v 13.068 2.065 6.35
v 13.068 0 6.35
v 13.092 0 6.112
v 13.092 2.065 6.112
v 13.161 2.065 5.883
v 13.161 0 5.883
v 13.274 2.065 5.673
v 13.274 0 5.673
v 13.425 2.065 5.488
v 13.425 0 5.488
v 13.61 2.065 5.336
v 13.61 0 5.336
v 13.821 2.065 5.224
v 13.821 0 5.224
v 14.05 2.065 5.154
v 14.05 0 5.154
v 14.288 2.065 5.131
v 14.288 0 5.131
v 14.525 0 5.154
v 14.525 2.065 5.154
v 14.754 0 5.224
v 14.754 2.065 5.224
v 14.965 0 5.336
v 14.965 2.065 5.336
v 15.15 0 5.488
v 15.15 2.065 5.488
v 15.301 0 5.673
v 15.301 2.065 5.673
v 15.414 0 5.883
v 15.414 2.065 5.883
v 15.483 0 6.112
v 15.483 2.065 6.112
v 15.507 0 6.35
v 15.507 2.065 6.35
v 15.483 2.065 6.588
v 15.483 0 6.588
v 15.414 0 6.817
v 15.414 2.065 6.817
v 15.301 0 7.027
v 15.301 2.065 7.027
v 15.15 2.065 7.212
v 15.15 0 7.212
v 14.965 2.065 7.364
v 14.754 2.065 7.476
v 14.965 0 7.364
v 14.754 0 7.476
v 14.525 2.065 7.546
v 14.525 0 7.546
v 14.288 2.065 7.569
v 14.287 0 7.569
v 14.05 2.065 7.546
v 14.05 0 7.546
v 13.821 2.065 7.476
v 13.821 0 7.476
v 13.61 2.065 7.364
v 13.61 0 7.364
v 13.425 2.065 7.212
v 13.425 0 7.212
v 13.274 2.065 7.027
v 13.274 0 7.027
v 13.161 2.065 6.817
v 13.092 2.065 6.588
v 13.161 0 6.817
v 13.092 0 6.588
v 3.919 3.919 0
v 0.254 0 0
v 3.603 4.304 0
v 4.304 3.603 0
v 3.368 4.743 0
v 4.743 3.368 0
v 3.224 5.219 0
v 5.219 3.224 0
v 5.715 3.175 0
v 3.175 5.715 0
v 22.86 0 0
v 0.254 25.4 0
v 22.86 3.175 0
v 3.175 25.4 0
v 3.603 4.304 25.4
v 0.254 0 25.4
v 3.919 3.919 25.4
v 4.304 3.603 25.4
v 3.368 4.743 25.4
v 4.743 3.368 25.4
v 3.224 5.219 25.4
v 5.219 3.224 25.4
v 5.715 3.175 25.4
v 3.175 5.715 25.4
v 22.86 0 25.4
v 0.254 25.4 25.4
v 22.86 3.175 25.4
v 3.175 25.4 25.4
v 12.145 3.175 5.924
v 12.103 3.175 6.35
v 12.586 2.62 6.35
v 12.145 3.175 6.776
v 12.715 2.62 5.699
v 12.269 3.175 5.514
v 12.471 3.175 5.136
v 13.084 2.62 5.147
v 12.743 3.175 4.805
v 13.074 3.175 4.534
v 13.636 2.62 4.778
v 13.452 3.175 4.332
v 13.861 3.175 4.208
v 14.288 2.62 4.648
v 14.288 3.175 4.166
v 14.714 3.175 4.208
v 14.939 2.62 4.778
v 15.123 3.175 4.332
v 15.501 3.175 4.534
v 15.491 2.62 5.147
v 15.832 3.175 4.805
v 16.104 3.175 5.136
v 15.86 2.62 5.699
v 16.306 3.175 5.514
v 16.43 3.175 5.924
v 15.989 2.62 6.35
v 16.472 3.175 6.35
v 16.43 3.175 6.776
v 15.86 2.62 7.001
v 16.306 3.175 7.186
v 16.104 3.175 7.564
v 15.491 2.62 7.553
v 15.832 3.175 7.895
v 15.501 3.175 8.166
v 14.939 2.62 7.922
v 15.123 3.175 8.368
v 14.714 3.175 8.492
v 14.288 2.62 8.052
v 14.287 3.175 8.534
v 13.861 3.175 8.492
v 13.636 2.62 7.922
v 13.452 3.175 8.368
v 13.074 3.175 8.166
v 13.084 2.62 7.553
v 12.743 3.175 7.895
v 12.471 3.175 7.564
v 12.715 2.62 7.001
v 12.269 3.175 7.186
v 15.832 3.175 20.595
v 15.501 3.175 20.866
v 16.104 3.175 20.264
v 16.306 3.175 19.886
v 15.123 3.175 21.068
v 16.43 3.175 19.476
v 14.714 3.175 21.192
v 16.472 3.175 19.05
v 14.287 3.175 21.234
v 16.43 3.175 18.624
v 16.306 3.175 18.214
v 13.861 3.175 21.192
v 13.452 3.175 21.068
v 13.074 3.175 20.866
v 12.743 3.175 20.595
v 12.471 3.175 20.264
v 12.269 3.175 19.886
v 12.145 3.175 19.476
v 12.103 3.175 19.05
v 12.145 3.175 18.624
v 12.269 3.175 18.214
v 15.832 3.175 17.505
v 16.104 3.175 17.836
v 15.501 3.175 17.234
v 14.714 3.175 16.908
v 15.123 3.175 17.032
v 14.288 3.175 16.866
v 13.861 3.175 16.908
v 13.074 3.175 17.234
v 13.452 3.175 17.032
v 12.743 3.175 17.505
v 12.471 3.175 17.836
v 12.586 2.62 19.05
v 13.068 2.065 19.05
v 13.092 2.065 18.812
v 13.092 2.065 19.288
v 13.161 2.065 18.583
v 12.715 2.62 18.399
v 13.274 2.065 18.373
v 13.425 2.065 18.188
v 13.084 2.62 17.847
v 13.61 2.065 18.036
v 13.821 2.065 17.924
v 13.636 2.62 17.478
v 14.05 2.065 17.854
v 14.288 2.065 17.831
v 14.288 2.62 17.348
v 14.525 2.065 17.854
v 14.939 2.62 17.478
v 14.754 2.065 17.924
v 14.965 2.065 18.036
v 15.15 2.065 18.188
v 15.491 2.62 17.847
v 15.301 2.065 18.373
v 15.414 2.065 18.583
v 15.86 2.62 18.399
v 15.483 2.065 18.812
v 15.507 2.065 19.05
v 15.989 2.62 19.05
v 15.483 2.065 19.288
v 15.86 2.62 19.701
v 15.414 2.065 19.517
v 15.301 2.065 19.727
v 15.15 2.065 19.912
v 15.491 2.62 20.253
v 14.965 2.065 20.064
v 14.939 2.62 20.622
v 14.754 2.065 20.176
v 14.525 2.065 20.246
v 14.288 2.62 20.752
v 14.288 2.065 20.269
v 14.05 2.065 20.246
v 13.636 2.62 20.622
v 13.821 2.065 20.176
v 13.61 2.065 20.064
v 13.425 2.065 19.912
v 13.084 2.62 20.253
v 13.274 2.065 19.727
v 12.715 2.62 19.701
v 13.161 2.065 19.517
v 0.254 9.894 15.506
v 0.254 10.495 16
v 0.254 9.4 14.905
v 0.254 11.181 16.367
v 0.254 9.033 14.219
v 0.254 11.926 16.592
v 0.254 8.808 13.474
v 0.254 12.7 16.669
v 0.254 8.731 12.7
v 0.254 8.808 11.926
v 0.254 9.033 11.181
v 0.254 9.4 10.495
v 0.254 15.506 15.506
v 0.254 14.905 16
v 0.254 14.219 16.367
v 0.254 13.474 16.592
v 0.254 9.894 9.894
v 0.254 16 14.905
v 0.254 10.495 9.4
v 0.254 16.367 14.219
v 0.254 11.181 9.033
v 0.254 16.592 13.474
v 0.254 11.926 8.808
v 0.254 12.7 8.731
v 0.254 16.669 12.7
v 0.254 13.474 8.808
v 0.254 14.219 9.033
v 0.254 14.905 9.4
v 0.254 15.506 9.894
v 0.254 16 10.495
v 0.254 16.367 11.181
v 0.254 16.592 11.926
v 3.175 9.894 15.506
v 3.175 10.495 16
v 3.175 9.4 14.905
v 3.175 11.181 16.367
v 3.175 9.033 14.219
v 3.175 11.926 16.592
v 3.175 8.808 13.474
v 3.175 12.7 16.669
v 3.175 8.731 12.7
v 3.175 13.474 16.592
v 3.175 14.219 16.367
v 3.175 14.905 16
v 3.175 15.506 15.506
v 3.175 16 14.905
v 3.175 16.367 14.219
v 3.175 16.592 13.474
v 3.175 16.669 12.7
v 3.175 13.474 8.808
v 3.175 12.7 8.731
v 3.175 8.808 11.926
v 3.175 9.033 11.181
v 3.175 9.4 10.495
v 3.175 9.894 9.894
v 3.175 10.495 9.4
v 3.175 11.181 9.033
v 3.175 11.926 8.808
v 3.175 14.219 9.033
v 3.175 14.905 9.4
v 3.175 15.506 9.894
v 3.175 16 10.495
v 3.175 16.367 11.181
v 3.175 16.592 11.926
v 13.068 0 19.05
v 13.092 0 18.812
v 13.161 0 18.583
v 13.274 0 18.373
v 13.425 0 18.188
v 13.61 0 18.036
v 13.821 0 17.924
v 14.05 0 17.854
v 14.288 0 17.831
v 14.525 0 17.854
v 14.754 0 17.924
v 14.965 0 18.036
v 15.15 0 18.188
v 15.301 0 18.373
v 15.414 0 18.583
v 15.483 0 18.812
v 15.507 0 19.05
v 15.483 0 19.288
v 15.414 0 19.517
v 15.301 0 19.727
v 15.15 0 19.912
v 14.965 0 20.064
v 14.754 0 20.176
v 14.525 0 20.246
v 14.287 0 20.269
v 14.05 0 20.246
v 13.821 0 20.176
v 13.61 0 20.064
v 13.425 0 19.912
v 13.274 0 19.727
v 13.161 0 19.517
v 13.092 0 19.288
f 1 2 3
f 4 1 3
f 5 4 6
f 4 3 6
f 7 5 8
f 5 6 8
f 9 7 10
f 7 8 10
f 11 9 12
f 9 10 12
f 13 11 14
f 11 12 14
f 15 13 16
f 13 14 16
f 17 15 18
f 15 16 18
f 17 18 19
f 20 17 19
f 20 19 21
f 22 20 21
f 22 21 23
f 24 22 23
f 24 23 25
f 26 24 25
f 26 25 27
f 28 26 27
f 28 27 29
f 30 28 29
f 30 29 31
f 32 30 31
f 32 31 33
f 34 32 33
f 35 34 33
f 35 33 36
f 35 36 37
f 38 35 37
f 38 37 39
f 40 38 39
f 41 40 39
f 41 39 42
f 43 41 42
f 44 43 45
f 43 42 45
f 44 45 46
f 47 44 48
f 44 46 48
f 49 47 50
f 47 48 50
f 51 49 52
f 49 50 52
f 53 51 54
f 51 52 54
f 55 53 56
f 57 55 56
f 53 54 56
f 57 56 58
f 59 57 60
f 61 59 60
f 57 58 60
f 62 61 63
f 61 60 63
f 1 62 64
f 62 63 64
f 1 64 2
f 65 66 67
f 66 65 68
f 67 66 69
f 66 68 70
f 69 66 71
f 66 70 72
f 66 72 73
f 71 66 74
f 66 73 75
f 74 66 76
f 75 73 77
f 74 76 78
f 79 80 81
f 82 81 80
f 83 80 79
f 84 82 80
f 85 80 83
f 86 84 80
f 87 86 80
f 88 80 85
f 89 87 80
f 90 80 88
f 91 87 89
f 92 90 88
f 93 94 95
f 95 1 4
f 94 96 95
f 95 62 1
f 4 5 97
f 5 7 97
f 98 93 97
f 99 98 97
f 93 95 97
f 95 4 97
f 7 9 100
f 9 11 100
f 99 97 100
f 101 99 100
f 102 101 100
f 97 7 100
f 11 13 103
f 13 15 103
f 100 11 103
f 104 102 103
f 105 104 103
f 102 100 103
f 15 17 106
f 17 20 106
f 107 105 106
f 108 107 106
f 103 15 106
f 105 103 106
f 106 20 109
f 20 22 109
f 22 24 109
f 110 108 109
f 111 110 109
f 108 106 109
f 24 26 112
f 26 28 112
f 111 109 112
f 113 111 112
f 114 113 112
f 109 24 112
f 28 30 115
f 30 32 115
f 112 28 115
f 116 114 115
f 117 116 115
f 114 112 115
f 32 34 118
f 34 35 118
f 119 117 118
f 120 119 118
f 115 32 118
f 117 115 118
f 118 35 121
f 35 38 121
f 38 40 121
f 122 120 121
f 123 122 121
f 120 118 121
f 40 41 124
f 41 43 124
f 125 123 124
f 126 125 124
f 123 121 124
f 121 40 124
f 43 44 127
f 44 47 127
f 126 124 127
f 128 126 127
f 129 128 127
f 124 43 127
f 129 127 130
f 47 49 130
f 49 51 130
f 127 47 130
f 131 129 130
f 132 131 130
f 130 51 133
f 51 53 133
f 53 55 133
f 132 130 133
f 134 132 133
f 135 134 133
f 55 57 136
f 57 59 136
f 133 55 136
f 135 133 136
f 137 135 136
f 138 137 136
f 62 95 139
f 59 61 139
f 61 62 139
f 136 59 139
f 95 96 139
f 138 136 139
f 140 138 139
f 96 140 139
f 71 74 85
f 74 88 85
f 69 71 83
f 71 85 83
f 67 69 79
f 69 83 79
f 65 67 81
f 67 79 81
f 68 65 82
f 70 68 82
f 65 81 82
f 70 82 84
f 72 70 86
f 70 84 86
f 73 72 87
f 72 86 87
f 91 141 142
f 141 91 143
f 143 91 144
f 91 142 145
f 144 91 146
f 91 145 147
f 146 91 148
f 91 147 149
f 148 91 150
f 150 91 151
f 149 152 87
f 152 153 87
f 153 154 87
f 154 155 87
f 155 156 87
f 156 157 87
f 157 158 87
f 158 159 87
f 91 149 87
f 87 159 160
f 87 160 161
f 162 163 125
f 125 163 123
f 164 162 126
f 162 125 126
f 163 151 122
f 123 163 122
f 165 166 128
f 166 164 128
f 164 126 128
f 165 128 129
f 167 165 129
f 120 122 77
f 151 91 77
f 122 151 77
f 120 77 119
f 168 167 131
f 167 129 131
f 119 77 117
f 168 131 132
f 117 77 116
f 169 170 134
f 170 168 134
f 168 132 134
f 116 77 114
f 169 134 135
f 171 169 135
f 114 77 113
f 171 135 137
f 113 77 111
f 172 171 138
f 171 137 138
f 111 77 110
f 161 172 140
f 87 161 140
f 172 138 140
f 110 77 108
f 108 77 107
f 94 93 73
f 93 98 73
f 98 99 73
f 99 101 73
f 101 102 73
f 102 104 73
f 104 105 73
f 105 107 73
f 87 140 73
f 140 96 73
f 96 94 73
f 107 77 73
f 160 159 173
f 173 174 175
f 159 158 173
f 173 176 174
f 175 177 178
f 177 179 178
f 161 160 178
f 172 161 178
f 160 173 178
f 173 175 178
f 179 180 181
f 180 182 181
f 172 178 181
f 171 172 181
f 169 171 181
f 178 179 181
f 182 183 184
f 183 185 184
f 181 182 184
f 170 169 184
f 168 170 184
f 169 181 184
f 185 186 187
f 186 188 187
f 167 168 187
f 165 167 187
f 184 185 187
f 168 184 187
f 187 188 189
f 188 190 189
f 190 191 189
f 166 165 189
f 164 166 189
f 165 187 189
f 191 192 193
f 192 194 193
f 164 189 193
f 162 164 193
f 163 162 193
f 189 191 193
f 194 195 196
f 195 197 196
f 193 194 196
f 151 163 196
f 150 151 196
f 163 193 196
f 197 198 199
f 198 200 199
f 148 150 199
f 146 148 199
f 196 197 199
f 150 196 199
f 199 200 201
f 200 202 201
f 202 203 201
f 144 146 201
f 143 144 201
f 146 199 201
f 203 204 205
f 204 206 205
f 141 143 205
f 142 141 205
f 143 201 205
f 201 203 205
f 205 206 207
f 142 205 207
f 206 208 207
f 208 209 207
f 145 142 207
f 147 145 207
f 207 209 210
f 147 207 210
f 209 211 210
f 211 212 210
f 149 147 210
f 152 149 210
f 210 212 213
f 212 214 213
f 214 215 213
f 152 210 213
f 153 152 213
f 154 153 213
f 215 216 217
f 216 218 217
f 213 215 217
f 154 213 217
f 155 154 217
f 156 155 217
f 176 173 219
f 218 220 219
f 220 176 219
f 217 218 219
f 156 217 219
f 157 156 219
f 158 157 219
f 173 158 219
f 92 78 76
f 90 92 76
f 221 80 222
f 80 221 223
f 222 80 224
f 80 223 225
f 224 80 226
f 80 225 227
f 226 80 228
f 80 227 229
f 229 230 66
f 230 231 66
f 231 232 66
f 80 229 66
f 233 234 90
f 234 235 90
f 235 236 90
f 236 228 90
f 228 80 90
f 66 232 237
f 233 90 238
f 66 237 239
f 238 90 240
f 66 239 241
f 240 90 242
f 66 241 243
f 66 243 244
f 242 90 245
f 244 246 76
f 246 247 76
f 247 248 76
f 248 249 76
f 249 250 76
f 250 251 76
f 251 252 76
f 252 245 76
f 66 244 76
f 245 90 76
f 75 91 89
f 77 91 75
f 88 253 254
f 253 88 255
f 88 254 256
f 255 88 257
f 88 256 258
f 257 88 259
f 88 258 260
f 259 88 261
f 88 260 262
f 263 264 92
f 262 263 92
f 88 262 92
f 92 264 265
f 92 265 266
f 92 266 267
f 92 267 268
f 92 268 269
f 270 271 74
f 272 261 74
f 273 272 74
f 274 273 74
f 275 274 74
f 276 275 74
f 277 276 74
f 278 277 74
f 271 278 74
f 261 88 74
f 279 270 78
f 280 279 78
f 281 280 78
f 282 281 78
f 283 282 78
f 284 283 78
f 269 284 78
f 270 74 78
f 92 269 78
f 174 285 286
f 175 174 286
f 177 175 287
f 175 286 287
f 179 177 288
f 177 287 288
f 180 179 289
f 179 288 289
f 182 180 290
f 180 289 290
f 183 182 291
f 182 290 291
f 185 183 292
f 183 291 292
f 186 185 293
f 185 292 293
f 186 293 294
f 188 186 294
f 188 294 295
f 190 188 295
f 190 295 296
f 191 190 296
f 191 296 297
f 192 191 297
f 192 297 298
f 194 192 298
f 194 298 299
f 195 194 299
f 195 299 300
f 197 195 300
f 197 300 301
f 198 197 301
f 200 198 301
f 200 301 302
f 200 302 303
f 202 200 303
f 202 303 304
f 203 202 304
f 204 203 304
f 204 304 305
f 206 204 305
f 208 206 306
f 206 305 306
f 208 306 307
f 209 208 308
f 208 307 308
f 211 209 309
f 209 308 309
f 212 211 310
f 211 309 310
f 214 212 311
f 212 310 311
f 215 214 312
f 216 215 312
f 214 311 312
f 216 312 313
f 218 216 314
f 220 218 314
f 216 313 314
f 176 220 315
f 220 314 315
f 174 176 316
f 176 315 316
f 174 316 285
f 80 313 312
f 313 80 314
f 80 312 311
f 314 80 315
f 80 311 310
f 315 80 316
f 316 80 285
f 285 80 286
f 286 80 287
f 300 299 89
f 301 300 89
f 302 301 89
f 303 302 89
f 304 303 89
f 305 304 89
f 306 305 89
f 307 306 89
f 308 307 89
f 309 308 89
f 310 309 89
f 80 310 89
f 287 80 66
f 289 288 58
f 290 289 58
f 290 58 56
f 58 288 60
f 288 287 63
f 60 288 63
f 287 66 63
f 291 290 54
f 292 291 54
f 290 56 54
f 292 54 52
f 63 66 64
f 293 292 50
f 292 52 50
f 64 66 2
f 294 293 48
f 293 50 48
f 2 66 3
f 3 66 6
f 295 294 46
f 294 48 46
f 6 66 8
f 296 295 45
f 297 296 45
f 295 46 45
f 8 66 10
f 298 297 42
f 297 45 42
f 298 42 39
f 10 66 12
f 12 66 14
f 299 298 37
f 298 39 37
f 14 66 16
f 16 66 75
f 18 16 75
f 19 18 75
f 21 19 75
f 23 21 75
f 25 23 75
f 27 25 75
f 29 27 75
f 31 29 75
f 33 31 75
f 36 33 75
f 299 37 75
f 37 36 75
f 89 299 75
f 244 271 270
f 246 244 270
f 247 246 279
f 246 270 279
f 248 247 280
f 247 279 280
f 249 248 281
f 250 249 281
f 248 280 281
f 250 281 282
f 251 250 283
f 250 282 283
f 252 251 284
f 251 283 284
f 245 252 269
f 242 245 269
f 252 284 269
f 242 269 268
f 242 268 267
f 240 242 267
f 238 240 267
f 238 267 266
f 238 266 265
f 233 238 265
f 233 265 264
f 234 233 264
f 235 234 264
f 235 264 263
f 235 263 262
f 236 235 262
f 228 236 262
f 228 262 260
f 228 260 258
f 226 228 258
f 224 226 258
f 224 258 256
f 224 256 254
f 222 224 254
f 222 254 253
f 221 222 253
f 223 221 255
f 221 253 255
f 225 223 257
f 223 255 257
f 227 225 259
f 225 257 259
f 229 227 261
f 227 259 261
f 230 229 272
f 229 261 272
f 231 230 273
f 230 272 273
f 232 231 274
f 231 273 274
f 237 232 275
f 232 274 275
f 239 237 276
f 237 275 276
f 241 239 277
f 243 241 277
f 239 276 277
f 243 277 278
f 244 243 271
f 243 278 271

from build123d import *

# Parameters (mm, degrees)
BOSS_EXTRUDE1_DEPTH                            = 25.4
SKETCH5_R                                      = 3.96875
CUT_EXTRUDE2_DEPTH                             = 4.175
CSK_FOR_2_FLAT_HEAD_MACHINE_SCREW1_D           = 2.4384
CSK_FOR_2_FLAT_HEAD_MACHINE_SCREW1_DEPTH       = 3.175
CSK_FOR_2_FLAT_HEAD_MACHINE_SCREW1_CSINK_D     = 4.3688
CSK_FOR_2_FLAT_HEAD_MACHINE_SCREW1_CSINK_ANGLE = 82
SKETCH9_W                                      = 2.54
SKETCH9_H                                      = 25.4
CUT_EXTRUDE3_DEPTH                             = 4.175
FILLET1_R                                      = 2.54
SKETCH10_W                                     = 0.254
SKETCH10_H                                     = 25.4
CUT_EXTRUDE4_DEPTH                             = 26.4


with BuildPart() as part:
    # Sketch1 → Boss-Extrude1 (new body)
    with BuildSketch(Plane.XY):
        Polygon((0, 0), (25.4, 0), (25.4, 3.175), (3.175, 3.175), (3.175, 25.4), (0, 25.4), align=None)
    extrude(amount=BOSS_EXTRUDE1_DEPTH)

    # Sketch5 → Cut-Extrude2 (cut, through all)
    with BuildSketch(Plane(origin=(3.175, 0, 0), x_dir=(0, 0, -1), z_dir=(1, 0, 0))):
        with Locations((-12.7, 12.7)):
            Circle(SKETCH5_R)
    extrude(amount=-CUT_EXTRUDE2_DEPTH, mode=Mode.SUBTRACT)

    # CSK for #2 Flat Head Machine Screw1
    with Locations(Plane(origin=(0, 3.175, 0), x_dir=(1, 0, 0), z_dir=(0, 1, 0))):
        with Locations((14.2875, -19.05), (14.2875, -6.35)):
            CounterSinkHole(CSK_FOR_2_FLAT_HEAD_MACHINE_SCREW1_D / 2, CSK_FOR_2_FLAT_HEAD_MACHINE_SCREW1_CSINK_D / 2, depth=CSK_FOR_2_FLAT_HEAD_MACHINE_SCREW1_DEPTH, counter_sink_angle=CSK_FOR_2_FLAT_HEAD_MACHINE_SCREW1_CSINK_ANGLE)

    # Sketch9 → Cut-Extrude3 (cut, through all)
    with BuildSketch(Plane(origin=(0, 3.175, 0), x_dir=(1, 0, 0), z_dir=(0, 1, 0))):
        with Locations((24.13, -12.7)):
            Rectangle(SKETCH9_W, SKETCH9_H)
    extrude(amount=-CUT_EXTRUDE3_DEPTH, mode=Mode.SUBTRACT)

    # Fillet1
    fillet1_edges = [part.edges().sort_by_distance(p)[0] for p in [
        (3.175, 3.175, 12.7),
    ]]
    fillet(fillet1_edges, radius=FILLET1_R)

    # Sketch10 → Cut-Extrude4 (cut, through all)
    with BuildSketch(Plane(origin=(0, 25.4, 0), x_dir=(1, 0, 0), z_dir=(0, 1, 0))):
        with Locations((0.127, -12.7)):
            Rectangle(SKETCH10_W, SKETCH10_H)
    extrude(amount=-CUT_EXTRUDE4_DEPTH, mode=Mode.SUBTRACT)


solid = part.part
